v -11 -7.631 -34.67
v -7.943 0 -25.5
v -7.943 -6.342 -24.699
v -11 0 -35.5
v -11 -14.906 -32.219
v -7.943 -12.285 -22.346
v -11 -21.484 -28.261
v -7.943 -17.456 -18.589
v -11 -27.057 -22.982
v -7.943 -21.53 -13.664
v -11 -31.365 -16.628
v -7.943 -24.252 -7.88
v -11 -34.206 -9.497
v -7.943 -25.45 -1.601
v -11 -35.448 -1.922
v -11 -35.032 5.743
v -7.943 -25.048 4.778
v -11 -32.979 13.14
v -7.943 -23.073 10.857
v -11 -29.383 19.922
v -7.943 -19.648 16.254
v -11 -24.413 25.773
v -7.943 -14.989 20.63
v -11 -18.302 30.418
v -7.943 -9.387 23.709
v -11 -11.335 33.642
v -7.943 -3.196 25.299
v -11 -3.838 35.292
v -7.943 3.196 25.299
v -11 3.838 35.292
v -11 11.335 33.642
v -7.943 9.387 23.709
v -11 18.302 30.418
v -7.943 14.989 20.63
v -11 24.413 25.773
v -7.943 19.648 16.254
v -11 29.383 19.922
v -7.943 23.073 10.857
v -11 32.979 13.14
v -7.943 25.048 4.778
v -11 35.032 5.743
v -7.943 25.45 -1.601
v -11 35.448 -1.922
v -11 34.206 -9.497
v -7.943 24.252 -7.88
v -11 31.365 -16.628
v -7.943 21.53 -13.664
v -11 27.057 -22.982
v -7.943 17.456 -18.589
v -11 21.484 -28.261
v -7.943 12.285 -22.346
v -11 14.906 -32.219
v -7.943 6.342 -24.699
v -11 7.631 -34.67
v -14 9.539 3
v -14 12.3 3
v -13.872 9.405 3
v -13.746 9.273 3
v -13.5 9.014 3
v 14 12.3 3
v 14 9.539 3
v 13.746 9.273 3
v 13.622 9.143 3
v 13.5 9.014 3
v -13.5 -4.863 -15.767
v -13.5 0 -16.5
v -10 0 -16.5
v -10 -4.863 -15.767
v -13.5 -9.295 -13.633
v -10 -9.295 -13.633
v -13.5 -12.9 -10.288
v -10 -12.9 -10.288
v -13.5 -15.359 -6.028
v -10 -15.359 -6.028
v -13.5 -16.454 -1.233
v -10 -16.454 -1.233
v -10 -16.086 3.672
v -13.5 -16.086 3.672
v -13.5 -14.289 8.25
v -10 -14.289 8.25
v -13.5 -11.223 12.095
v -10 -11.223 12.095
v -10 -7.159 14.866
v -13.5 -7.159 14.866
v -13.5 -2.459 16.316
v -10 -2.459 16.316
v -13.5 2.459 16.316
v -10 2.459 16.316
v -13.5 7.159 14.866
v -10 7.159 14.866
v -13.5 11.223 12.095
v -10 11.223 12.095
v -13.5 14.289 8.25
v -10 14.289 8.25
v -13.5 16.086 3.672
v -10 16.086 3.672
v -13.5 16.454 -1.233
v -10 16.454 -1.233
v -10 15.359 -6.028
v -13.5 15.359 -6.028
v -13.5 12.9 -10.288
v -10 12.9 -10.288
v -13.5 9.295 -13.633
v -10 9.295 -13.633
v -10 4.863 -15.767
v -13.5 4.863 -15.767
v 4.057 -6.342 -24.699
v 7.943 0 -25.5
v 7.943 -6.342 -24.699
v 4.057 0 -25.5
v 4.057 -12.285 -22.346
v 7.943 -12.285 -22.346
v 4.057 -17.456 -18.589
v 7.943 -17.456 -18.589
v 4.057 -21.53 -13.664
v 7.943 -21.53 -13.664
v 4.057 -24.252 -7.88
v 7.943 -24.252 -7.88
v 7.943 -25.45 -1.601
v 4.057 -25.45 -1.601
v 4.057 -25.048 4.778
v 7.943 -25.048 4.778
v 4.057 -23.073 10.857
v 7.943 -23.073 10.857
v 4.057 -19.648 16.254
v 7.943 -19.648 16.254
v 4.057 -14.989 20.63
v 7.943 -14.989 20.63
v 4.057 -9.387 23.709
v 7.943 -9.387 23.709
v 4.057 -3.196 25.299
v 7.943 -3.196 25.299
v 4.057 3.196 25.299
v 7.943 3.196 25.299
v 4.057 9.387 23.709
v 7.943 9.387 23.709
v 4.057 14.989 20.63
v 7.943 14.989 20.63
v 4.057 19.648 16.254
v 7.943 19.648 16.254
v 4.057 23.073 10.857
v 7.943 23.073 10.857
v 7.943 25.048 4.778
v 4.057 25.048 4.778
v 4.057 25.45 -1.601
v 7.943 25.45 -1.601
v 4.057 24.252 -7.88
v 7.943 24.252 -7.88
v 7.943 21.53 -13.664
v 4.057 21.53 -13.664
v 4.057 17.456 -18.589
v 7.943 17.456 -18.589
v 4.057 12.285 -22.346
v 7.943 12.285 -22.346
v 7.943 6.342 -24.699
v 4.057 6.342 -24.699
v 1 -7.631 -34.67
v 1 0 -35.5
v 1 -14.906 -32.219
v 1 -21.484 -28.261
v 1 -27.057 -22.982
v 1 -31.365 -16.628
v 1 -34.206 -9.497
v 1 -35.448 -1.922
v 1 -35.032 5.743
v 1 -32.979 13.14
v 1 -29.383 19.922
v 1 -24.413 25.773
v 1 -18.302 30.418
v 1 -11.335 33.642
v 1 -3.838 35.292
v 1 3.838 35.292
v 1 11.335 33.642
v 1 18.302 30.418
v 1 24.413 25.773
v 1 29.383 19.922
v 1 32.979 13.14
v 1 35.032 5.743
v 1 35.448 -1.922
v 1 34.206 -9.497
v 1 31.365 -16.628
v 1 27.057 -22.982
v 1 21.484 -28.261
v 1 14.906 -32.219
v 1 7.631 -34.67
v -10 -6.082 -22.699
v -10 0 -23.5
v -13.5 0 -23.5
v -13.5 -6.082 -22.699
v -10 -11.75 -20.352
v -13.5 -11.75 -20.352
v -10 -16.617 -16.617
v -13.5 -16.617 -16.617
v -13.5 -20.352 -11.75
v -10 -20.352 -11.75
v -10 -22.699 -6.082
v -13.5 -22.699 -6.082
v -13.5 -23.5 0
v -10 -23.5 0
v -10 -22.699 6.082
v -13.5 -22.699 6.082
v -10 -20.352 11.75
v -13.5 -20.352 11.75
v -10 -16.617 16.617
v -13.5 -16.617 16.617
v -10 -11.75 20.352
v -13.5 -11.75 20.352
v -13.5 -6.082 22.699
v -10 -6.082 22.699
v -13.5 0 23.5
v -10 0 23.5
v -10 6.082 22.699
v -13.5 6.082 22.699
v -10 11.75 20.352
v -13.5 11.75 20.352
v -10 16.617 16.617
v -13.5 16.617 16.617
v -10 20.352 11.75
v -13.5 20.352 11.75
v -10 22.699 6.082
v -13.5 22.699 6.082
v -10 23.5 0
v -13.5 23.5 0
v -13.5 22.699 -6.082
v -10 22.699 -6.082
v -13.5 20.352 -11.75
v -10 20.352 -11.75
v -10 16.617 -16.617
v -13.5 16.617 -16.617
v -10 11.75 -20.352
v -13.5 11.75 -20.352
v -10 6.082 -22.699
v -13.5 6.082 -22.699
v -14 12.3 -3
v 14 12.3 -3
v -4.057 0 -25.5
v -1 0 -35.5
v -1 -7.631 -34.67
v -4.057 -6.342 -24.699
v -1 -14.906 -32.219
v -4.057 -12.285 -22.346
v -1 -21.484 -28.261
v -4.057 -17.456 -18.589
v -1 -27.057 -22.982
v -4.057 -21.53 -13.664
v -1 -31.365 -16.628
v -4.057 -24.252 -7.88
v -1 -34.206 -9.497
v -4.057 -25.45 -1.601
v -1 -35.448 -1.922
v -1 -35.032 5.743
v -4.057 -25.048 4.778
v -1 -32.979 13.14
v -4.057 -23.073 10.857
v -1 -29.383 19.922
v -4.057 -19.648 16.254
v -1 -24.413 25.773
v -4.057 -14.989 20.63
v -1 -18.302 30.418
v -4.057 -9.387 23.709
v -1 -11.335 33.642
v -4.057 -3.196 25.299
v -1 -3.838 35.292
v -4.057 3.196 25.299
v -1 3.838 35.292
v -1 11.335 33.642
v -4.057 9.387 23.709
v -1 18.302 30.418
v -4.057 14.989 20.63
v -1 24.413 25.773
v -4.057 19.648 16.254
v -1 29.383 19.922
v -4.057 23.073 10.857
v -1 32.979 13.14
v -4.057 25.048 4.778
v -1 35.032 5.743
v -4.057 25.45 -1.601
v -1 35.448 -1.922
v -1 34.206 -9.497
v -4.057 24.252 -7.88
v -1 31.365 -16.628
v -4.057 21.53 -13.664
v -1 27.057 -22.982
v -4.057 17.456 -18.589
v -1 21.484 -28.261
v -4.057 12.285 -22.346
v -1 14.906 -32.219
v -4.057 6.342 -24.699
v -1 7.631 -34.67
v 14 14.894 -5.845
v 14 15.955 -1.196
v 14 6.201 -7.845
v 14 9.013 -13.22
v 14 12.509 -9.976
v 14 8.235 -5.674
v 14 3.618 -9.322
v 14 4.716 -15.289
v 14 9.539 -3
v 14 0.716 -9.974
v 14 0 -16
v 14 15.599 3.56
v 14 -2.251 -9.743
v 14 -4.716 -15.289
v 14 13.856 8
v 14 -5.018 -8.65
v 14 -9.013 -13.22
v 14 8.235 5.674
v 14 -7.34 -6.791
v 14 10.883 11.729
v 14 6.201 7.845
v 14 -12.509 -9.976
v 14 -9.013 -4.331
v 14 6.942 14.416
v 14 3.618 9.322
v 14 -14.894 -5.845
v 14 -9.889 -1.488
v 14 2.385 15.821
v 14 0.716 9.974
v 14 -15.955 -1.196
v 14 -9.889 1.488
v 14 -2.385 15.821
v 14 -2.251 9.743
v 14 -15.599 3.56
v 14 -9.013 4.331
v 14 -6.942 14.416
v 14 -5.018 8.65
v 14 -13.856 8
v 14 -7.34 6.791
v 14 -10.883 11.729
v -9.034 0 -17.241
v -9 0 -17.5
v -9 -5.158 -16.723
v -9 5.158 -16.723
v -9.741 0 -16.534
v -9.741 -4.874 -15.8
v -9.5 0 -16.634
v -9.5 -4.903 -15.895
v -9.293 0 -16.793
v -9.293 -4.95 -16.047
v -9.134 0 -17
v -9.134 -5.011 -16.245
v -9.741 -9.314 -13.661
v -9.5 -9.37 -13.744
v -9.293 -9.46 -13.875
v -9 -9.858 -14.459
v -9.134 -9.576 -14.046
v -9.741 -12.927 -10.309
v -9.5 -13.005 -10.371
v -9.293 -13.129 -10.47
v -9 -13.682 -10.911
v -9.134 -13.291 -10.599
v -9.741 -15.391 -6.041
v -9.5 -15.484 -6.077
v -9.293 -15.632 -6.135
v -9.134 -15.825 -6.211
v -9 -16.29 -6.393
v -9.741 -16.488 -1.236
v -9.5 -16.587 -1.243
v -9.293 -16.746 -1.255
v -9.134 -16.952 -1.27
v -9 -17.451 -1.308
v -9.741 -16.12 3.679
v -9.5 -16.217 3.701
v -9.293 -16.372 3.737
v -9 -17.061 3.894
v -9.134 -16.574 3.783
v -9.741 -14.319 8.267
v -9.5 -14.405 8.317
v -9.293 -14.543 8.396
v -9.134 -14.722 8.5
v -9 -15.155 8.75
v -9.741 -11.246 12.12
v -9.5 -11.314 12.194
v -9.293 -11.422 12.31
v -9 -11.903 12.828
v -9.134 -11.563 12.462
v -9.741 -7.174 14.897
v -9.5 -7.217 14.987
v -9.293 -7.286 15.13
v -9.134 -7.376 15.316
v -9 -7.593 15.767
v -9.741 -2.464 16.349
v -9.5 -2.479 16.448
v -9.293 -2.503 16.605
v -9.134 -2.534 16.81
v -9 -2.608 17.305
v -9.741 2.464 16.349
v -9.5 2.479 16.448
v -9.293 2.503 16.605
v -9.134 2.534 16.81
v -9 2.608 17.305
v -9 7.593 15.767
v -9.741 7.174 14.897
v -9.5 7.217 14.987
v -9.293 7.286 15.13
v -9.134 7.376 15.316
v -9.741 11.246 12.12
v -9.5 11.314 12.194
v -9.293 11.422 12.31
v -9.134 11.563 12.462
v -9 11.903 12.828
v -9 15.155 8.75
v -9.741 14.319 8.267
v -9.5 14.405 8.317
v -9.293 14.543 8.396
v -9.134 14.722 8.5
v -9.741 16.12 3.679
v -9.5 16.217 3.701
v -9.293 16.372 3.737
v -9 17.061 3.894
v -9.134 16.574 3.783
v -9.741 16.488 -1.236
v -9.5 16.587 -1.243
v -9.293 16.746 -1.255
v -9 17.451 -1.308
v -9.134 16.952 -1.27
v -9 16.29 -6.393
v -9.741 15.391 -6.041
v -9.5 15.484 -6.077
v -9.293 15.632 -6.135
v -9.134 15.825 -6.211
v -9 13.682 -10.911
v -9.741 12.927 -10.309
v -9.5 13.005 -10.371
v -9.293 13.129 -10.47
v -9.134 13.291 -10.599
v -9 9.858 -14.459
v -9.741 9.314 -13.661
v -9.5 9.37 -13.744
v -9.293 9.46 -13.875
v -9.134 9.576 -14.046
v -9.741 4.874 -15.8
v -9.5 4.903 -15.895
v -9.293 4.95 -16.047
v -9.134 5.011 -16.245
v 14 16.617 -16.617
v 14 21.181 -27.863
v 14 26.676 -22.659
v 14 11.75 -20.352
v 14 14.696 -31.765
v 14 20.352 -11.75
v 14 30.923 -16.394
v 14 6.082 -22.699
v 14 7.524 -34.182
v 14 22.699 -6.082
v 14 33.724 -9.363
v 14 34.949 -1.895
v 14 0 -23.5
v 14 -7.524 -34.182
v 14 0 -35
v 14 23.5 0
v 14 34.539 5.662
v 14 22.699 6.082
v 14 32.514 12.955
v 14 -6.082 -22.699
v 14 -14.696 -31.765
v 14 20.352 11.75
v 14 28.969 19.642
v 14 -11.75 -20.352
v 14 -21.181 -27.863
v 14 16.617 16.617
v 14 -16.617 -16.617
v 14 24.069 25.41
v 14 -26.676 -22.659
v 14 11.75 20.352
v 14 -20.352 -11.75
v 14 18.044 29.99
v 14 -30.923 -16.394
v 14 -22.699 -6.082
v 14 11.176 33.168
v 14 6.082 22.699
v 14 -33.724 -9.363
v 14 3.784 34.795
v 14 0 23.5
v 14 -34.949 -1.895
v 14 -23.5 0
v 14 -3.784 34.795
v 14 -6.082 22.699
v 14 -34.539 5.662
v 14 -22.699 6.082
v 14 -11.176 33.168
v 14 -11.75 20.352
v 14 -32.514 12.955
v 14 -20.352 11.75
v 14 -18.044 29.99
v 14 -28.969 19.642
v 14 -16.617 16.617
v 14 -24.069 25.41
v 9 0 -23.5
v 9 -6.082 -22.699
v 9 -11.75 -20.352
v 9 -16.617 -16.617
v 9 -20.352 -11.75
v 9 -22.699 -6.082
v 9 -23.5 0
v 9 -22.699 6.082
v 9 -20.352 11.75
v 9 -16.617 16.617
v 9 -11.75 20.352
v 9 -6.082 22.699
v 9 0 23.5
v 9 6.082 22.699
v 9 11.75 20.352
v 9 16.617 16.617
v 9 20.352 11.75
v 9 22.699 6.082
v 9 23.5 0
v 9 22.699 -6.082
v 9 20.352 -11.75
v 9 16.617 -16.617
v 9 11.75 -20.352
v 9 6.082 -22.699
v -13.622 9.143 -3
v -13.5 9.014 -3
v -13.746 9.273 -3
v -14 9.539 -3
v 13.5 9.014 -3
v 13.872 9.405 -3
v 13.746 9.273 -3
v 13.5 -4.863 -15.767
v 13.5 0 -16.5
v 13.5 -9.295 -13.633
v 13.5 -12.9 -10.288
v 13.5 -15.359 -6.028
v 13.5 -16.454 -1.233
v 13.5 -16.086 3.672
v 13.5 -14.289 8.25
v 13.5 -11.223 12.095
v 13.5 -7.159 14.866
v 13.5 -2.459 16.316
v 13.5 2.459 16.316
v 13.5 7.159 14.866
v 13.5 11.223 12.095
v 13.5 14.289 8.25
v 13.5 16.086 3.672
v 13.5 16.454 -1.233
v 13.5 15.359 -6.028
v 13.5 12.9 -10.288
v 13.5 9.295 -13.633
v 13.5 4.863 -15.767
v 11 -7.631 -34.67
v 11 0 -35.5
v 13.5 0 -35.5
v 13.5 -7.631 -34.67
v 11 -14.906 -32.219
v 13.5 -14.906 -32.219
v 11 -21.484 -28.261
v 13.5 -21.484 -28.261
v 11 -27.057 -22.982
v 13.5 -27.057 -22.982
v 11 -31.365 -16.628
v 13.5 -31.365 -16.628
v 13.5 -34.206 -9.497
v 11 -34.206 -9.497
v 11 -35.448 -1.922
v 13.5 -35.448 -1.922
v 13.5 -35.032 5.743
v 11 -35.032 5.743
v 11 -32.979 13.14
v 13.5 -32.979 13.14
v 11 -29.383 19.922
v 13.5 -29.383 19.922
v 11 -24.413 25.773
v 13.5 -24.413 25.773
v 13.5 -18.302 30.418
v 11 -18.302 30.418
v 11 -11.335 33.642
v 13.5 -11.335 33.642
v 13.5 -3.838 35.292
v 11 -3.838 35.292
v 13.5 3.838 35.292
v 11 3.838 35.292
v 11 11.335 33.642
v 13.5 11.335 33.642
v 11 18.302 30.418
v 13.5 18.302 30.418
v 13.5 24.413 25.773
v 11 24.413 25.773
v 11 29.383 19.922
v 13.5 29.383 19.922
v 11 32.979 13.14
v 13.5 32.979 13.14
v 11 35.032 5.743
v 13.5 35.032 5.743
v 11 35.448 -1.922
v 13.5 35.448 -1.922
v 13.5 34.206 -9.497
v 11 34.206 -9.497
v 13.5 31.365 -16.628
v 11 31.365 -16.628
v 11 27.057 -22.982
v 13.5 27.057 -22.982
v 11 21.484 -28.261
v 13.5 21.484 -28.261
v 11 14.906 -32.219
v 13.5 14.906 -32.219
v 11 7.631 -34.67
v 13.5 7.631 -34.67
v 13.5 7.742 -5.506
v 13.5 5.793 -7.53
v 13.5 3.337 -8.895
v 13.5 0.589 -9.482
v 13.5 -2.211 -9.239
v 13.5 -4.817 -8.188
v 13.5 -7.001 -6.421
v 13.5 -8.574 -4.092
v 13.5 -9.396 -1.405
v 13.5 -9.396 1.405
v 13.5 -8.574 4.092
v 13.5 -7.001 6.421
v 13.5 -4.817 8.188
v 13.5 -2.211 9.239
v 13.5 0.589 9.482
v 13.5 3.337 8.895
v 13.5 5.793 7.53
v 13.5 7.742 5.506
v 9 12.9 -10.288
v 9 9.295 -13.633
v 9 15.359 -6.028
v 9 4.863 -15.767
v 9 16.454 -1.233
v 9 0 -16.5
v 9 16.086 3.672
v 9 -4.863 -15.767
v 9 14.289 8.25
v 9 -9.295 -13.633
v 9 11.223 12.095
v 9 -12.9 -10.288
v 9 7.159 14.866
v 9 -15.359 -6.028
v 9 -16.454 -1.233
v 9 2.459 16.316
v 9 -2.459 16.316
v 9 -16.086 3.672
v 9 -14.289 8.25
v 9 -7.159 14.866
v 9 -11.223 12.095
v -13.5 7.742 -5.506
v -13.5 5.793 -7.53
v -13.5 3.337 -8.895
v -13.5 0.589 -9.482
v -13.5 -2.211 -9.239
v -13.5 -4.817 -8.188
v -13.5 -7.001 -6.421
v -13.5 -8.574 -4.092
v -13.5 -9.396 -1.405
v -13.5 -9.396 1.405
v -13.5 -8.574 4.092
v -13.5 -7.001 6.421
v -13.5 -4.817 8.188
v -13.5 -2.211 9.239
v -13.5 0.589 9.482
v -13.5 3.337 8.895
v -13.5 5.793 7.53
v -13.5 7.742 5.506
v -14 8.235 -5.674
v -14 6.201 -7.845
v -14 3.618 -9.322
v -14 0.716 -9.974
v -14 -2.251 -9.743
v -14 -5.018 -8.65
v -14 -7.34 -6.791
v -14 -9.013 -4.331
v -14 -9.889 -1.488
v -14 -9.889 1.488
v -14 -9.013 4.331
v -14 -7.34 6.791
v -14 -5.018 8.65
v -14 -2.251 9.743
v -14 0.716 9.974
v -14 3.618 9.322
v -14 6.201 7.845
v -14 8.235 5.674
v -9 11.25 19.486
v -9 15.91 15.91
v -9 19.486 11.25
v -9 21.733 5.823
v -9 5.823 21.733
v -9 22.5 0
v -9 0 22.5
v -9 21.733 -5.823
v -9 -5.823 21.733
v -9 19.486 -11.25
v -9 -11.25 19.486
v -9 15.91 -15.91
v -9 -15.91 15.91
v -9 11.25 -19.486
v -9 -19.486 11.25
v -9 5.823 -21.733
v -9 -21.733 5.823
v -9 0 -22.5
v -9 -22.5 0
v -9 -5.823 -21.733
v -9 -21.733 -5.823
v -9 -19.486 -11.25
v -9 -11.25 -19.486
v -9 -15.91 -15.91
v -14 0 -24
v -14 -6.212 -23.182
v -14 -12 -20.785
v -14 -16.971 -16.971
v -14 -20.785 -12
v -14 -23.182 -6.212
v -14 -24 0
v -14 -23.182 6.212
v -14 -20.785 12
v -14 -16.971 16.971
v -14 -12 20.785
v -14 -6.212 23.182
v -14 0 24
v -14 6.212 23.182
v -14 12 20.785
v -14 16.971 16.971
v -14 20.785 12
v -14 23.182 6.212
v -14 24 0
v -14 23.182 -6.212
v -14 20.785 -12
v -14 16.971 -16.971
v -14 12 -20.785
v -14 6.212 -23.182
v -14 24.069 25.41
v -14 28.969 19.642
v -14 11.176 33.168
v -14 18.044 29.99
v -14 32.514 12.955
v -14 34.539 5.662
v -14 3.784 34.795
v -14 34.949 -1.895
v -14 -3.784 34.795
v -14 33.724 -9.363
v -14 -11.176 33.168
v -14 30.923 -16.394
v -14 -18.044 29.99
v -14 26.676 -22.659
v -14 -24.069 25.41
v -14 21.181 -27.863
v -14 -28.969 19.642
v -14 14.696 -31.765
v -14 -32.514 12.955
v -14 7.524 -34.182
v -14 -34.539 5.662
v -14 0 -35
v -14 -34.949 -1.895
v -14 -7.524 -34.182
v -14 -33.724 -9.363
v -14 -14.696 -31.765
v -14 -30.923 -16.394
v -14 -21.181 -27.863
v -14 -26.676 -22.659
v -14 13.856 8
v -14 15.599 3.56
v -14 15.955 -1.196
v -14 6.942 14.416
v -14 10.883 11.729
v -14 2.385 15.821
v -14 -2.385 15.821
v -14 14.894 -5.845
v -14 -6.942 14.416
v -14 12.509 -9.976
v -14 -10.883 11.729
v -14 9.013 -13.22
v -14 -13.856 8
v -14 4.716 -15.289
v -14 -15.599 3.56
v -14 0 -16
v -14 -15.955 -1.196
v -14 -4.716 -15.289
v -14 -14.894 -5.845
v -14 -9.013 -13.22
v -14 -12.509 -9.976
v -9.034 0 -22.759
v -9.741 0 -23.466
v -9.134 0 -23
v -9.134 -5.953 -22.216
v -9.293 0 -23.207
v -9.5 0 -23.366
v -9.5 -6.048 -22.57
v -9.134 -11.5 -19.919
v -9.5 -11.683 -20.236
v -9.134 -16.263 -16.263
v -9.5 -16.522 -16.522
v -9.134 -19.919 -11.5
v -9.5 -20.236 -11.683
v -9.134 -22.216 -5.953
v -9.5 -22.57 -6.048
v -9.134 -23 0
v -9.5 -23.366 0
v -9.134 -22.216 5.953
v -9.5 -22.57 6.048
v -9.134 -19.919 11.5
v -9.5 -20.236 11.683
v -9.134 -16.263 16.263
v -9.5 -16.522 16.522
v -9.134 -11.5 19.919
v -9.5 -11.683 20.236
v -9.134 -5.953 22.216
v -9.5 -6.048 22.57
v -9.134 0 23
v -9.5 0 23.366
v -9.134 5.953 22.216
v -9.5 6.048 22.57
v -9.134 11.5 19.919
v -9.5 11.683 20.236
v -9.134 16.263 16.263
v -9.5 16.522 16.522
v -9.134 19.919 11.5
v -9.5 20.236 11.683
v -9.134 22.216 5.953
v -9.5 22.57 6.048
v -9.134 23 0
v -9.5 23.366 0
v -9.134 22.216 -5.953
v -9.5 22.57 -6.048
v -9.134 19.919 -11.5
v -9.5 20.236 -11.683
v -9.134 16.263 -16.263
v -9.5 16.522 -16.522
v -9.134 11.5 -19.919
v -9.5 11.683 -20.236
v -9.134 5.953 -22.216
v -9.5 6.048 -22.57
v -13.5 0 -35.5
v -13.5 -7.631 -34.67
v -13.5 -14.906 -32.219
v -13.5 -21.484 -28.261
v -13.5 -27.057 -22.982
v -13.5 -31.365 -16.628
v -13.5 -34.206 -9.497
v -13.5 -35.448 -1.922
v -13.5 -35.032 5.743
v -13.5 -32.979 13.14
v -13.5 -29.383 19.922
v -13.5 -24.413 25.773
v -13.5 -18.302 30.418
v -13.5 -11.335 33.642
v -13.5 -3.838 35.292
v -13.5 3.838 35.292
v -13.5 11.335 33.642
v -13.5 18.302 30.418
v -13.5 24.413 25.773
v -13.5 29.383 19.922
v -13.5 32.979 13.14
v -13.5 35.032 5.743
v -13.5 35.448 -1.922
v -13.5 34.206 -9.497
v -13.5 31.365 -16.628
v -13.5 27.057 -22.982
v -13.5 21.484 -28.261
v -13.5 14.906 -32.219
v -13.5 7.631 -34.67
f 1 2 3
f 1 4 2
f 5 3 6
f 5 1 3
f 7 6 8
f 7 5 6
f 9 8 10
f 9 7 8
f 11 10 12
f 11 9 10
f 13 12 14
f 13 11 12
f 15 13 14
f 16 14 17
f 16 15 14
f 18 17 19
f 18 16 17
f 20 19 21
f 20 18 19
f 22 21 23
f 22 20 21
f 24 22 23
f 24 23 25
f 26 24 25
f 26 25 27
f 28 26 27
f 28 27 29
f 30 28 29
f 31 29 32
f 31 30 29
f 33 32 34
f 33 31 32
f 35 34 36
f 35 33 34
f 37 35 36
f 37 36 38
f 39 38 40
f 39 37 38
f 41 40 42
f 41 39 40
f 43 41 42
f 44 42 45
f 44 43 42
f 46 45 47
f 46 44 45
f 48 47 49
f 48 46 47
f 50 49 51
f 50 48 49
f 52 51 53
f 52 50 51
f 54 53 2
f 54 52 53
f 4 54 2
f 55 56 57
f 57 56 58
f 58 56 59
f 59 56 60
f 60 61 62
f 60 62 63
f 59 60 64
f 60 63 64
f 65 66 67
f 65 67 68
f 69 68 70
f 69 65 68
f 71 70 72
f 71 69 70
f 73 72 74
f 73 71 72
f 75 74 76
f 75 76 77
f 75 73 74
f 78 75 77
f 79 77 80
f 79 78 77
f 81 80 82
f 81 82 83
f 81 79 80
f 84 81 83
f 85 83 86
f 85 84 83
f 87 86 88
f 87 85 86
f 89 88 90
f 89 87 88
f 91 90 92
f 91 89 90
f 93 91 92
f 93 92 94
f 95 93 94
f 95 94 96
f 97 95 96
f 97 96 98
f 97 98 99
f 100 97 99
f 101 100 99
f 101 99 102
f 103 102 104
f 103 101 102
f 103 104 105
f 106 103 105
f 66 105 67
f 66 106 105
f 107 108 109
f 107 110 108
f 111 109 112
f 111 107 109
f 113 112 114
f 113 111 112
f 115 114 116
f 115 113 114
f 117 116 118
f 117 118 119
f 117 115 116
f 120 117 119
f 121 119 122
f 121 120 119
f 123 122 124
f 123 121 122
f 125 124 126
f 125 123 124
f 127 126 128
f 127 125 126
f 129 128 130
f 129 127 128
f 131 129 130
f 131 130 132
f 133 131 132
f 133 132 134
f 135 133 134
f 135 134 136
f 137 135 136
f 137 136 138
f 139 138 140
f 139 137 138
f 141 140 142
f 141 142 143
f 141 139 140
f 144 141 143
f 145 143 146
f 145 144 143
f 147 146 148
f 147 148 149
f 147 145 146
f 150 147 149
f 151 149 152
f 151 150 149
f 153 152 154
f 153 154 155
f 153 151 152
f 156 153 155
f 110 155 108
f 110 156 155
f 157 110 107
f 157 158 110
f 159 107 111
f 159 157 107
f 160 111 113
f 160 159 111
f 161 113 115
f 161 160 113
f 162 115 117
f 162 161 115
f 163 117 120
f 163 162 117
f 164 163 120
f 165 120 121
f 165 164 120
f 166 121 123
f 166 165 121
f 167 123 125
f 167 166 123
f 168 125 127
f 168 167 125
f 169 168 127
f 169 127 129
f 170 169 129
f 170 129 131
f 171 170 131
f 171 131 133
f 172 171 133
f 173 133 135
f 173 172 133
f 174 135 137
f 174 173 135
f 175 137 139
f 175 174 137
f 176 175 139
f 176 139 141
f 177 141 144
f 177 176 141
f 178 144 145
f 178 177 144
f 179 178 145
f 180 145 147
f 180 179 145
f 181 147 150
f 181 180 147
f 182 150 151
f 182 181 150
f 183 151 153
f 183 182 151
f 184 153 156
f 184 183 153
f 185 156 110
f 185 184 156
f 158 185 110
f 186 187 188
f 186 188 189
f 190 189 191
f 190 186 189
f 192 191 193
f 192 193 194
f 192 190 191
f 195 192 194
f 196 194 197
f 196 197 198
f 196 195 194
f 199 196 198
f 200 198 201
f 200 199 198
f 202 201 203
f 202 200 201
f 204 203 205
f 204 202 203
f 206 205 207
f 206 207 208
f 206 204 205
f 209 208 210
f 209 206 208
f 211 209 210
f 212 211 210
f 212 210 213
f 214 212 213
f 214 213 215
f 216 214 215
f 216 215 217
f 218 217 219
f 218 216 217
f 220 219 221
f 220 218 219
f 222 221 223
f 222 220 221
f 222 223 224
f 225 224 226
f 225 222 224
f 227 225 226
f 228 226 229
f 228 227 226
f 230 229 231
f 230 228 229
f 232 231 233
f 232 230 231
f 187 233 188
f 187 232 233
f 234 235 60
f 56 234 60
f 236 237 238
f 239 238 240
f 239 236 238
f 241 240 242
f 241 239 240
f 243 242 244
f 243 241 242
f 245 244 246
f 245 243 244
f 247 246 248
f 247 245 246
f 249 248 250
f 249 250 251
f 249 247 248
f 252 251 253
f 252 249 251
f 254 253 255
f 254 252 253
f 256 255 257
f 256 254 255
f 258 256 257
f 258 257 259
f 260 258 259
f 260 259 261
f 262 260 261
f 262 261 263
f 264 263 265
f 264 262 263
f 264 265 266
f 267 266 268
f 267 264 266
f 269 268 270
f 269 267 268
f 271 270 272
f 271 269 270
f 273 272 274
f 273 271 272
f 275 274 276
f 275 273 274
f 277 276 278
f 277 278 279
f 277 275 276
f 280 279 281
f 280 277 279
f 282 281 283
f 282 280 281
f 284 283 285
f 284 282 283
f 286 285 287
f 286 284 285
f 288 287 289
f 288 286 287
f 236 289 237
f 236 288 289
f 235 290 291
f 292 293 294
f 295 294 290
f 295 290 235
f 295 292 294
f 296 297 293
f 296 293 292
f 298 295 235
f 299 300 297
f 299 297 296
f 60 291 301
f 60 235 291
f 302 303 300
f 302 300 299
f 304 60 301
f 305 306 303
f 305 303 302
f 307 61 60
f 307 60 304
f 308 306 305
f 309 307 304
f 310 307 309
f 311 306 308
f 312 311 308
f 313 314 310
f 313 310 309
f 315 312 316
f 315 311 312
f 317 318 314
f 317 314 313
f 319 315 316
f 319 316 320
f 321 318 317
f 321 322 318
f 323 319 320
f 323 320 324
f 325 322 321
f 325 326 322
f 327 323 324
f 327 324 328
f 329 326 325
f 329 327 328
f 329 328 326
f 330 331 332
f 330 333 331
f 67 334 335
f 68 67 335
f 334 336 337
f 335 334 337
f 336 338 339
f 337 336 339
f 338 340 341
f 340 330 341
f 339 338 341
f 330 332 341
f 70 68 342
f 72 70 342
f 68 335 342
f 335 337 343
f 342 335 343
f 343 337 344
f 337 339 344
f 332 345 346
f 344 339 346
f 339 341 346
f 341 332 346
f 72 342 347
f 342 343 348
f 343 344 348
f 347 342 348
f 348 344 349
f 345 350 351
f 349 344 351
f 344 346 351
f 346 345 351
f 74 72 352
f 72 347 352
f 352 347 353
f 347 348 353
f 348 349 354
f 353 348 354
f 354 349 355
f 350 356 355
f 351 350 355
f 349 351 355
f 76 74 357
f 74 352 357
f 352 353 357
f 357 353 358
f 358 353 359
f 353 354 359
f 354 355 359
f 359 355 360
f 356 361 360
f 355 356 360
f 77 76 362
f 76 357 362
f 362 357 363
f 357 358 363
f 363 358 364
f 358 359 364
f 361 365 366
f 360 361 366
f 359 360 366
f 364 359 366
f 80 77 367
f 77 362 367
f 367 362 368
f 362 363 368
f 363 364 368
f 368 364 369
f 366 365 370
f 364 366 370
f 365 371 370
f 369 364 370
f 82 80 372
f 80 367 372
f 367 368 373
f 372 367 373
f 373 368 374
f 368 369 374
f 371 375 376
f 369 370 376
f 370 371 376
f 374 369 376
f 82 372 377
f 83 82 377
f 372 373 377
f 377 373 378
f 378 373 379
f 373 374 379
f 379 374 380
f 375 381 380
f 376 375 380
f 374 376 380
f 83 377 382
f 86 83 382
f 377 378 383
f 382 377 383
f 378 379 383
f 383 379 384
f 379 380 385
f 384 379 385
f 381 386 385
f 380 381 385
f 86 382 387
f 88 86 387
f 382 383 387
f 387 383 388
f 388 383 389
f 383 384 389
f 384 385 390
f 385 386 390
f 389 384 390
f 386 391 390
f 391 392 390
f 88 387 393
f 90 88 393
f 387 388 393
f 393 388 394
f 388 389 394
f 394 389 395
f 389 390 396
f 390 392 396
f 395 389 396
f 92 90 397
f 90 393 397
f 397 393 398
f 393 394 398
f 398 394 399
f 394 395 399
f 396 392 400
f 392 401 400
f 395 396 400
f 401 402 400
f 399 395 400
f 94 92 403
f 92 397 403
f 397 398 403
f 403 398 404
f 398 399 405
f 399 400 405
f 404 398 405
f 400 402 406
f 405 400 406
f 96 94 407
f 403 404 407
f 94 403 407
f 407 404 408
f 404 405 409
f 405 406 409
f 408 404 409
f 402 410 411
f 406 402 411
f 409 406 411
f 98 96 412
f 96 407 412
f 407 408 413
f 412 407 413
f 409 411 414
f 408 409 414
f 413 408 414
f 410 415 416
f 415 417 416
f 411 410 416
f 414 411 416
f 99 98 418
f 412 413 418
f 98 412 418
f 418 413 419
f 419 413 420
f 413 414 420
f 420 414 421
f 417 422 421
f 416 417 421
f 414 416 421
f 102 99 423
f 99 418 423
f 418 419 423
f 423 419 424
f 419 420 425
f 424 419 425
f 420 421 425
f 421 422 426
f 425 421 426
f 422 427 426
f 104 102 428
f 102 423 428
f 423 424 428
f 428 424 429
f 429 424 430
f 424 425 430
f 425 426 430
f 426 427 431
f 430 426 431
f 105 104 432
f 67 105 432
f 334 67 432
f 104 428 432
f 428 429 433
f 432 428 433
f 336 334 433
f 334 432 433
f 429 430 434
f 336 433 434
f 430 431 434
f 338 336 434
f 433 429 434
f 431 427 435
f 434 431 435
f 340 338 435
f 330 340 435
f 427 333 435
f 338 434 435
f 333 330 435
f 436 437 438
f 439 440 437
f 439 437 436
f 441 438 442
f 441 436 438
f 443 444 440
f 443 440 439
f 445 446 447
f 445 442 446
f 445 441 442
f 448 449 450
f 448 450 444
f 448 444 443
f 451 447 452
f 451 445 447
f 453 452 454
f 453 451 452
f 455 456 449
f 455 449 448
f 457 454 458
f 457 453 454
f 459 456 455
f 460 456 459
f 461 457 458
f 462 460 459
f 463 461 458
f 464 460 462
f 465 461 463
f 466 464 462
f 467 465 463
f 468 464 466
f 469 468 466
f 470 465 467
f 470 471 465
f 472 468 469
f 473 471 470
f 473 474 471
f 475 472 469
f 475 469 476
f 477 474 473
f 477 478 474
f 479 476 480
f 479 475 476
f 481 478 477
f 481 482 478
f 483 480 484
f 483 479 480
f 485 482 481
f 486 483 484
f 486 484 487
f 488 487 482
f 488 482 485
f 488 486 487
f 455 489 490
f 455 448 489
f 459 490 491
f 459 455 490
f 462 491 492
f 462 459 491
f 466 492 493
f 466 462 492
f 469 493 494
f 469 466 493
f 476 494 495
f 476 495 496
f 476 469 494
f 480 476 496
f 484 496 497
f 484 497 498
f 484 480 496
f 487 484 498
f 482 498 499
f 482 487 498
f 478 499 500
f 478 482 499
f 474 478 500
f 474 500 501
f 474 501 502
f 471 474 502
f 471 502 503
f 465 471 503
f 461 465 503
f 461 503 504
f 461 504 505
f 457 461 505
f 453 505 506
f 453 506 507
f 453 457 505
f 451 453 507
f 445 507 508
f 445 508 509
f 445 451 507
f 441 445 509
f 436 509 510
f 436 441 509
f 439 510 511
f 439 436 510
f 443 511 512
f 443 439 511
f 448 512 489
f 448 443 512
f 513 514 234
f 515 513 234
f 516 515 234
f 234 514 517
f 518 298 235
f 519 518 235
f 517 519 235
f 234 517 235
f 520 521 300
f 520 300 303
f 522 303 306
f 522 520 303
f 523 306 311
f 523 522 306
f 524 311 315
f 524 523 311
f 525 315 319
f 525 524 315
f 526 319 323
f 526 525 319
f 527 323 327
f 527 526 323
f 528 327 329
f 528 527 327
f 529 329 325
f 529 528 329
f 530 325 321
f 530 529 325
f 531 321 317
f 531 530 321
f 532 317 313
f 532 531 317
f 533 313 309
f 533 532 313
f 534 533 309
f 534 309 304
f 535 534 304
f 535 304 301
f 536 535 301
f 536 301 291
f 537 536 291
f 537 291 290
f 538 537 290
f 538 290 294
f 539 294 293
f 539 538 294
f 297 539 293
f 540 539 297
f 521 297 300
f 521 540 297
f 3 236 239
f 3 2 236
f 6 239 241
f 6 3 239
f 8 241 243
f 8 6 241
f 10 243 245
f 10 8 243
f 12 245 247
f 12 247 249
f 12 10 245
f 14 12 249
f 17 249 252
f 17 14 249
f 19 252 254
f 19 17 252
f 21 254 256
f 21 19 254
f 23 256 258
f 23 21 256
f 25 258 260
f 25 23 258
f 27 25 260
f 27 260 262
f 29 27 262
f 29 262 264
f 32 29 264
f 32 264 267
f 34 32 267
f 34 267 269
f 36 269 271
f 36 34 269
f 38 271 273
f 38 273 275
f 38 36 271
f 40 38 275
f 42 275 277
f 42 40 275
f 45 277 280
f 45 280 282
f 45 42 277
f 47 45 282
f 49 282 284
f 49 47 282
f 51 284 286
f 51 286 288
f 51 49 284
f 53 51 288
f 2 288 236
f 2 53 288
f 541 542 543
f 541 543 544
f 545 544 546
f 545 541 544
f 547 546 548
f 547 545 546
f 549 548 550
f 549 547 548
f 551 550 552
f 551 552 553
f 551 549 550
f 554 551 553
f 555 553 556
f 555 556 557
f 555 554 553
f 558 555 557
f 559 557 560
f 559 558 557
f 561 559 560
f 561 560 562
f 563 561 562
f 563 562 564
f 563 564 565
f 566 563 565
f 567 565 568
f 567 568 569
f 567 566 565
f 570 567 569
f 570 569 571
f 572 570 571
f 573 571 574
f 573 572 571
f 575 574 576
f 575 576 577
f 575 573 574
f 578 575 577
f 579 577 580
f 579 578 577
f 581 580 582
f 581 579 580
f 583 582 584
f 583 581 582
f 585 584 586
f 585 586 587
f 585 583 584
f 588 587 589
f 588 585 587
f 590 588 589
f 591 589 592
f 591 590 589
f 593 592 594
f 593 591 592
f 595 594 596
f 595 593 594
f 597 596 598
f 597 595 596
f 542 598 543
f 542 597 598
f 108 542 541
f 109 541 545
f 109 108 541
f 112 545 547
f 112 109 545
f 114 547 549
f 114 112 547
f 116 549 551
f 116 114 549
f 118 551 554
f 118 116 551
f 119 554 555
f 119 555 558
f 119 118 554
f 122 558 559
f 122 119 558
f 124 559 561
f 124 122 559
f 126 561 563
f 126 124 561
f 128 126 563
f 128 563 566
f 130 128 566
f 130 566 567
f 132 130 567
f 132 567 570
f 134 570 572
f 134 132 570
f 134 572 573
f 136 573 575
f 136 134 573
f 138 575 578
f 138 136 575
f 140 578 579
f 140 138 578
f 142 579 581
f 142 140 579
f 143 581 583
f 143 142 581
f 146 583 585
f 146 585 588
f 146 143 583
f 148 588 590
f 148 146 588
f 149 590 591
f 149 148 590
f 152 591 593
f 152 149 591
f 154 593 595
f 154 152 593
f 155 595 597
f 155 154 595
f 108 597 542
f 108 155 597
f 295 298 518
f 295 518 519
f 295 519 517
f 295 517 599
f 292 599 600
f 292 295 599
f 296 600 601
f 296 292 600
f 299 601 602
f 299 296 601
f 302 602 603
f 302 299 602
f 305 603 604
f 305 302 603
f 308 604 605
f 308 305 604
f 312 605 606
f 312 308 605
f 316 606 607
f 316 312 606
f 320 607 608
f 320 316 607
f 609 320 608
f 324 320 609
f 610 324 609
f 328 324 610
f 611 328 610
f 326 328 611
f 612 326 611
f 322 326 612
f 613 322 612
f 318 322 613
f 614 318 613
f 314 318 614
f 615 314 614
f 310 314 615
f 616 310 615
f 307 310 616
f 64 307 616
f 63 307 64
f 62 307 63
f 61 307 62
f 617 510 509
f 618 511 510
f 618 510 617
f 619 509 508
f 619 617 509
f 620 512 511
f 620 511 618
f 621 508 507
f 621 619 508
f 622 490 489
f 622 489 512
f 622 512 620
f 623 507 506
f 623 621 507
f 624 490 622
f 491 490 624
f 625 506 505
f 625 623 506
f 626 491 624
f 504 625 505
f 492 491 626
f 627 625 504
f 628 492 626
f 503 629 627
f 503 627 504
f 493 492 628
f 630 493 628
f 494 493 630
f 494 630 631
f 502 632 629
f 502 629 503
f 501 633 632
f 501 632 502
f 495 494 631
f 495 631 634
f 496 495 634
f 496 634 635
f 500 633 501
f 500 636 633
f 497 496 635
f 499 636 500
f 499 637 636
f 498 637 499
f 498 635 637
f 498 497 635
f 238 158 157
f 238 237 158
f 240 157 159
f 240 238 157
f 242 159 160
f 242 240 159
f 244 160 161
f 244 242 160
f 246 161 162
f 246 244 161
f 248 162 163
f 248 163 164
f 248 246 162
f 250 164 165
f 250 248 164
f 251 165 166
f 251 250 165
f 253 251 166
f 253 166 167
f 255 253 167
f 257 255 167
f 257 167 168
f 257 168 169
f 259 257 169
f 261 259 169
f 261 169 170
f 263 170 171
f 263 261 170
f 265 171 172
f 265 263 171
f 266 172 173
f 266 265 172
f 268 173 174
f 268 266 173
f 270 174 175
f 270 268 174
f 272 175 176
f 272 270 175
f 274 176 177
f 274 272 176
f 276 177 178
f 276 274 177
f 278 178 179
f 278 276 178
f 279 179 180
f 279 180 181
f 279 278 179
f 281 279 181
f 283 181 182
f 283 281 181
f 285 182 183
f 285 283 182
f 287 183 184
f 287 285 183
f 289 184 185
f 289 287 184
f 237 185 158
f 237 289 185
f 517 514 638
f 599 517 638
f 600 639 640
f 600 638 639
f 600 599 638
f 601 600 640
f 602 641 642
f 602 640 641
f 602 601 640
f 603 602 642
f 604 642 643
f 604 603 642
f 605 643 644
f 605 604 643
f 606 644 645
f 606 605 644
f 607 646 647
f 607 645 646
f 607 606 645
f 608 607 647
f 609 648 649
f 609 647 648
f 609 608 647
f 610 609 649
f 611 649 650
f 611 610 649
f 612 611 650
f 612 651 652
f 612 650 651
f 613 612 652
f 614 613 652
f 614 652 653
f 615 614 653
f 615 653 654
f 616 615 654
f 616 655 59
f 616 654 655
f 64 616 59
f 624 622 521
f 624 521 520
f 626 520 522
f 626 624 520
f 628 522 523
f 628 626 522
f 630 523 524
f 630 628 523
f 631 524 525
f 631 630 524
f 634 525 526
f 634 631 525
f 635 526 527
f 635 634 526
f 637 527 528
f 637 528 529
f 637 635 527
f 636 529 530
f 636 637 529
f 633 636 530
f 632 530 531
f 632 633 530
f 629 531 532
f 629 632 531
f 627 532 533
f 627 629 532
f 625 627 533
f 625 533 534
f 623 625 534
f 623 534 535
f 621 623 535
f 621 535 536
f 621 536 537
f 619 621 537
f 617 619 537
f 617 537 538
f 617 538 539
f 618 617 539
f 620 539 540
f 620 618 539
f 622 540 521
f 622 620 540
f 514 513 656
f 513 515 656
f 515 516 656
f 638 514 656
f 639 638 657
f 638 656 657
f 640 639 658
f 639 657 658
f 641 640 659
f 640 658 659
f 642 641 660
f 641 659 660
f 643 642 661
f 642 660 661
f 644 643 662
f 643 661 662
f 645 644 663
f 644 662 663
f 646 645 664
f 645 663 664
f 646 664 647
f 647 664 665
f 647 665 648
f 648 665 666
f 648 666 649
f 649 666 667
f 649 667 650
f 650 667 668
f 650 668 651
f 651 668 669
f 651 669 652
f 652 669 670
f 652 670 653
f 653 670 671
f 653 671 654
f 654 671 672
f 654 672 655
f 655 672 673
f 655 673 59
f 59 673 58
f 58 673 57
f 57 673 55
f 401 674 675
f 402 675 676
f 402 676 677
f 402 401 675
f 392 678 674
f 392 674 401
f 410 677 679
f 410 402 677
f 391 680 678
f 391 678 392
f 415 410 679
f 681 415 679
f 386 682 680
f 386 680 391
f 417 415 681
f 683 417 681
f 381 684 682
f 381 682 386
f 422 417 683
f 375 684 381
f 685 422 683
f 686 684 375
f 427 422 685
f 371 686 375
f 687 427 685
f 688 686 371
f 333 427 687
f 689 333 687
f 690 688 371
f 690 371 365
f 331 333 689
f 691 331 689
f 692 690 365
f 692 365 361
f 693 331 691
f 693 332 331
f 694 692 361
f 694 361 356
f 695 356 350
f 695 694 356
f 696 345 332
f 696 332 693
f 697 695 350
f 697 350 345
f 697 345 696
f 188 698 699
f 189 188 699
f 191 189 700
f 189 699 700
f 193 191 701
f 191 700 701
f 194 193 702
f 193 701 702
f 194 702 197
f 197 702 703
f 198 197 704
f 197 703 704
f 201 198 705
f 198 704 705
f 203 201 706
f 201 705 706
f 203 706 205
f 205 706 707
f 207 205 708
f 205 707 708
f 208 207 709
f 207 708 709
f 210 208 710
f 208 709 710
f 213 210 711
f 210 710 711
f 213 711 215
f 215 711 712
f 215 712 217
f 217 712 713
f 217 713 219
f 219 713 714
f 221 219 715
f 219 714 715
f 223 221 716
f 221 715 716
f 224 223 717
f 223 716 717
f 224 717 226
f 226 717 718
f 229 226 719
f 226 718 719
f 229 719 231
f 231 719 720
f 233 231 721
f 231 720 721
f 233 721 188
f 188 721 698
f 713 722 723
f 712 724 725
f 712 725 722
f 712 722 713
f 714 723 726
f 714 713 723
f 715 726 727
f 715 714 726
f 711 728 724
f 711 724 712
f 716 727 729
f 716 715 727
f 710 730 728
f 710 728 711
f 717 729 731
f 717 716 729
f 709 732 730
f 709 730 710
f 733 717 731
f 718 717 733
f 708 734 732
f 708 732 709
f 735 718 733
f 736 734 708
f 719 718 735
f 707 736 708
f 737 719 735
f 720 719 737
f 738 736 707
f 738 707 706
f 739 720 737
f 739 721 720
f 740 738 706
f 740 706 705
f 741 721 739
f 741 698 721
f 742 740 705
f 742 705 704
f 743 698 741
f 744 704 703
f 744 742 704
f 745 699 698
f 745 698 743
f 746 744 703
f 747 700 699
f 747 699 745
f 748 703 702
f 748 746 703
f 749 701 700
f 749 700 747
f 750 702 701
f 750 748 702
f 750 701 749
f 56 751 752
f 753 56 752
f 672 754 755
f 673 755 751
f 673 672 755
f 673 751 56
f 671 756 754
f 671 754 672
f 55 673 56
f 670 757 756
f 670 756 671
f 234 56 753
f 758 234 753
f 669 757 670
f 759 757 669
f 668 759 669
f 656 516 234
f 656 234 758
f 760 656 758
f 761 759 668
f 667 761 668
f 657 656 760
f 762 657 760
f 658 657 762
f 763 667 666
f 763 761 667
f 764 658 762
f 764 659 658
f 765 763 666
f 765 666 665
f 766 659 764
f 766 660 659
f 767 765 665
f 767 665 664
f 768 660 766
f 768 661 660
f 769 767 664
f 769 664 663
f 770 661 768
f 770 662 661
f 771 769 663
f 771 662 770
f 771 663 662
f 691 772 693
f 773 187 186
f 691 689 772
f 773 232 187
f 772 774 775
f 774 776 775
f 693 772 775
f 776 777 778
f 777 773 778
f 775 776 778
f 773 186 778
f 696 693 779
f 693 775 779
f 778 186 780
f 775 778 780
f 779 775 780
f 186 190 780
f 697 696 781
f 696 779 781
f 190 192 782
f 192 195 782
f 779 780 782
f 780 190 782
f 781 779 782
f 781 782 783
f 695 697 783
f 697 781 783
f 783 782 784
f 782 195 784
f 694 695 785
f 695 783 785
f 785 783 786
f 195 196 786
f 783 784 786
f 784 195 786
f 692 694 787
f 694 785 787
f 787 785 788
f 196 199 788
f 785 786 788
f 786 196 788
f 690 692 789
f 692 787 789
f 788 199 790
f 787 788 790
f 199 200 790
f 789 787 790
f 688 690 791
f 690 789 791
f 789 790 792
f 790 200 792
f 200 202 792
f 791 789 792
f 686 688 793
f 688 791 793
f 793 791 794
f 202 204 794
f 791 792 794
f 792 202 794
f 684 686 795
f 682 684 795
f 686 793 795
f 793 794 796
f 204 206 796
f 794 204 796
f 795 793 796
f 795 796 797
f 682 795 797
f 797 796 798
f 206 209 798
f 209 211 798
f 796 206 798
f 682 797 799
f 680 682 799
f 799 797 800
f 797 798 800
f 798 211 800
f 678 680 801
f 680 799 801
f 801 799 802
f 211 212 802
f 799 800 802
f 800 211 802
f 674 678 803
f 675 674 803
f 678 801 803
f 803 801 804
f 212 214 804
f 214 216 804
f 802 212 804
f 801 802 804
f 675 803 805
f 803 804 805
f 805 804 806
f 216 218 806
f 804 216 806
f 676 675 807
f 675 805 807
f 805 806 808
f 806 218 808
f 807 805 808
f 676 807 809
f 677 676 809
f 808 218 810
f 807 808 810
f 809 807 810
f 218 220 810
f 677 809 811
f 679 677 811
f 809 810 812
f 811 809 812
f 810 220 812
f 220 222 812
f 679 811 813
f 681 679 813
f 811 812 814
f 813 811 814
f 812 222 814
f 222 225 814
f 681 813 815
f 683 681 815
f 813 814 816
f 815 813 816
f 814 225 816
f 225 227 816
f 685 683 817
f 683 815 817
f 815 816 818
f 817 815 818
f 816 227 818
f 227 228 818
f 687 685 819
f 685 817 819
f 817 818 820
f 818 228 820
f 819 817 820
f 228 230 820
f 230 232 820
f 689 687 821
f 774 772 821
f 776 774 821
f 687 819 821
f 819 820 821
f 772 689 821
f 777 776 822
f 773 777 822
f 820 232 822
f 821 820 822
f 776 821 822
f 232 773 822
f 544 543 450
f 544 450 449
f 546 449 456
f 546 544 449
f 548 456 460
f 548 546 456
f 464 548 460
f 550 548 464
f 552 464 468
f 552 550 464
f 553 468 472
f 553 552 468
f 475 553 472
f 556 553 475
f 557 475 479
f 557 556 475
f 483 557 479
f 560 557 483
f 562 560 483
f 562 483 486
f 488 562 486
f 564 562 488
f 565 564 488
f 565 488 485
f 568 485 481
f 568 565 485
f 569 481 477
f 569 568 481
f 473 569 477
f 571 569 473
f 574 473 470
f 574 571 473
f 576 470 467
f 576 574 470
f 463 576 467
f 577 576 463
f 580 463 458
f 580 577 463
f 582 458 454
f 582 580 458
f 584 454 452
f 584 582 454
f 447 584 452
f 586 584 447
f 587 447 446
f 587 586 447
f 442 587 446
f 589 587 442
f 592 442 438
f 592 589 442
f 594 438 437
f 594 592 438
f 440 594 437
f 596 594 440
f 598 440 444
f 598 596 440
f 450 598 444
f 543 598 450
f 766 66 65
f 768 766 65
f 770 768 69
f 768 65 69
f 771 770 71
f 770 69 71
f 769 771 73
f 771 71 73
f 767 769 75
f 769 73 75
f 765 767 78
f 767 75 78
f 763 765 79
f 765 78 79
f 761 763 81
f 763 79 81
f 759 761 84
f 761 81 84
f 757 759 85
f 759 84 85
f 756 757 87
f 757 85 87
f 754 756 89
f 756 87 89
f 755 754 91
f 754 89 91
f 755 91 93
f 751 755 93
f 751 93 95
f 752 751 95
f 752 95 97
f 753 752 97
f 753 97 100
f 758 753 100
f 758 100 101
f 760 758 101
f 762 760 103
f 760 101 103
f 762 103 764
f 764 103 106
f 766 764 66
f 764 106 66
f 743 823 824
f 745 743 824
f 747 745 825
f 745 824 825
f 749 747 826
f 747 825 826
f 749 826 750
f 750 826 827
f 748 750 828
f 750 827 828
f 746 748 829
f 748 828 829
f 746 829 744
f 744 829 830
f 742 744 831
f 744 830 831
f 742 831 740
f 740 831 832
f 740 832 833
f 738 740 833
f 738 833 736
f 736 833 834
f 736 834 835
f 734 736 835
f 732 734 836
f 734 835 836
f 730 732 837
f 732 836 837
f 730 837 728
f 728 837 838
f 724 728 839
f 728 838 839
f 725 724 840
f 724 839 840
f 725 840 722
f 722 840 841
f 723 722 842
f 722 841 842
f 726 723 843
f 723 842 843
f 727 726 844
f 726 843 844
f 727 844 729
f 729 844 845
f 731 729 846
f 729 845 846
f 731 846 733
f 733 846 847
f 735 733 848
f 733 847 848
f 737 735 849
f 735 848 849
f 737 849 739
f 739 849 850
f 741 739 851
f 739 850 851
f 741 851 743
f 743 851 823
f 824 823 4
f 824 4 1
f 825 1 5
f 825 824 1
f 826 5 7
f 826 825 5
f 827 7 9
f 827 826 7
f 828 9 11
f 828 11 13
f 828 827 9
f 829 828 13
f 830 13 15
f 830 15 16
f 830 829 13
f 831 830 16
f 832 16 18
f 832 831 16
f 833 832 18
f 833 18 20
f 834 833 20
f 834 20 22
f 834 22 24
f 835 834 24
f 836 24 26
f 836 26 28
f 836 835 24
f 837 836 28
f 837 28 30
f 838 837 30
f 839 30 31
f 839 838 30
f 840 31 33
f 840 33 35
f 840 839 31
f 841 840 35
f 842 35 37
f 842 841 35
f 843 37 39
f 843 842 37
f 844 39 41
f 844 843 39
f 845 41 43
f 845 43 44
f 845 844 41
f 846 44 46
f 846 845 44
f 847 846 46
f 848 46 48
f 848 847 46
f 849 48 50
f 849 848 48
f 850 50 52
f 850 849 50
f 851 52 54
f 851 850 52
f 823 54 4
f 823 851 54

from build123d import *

# Parameters (mm, degrees)
CHAMFER1_SIZE      = 0.5
CHAMFER2_SIZE      = 0.5
FILLET2_R          = 1
CUT_EXTRUDE1_DEPTH = 58.484780595


with BuildPart() as part:
    # Sketch1 → Revolve1 (revolve)
    with BuildSketch(Plane(origin=(0, 0, 0), x_dir=(1, 0, 0), z_dir=(0, 1, 0))):
        Polygon((-14, 35.5), (-14, 23.5), (-9, 23.5), (-9, 16.5), (-14, 16.5), (-14, 9.5), (14, 9.5), (14, 16.5), (9, 16.5), (9, 23.5), (14, 23.5), (14, 35.5), (11, 35.5), (7.942693185, 25.5), (4.057306815, 25.5), (1, 35.5), (-1, 35.5), (-4.057306815, 25.5), (-7.942693185, 25.5), (-11, 35.5), align=None)
    revolve(axis=Axis((0, 0, 0), (-1, 0, 0)))

    # Chamfer1
    chamfer1_edges = [part.edges().sort_by_distance(p)[0] for p in [
        (14, 0, 9.5),
        (14, 0, 16.5),
        (14, 0, 35.5),
    ]]
    chamfer(chamfer1_edges, length=CHAMFER1_SIZE)

    # Chamfer2
    chamfer2_edges = [part.edges().sort_by_distance(p)[0] for p in [
        (-14, 0, 35.5),
        (-14, 0, 23.5),
        (-14, 0, 16.5),
        (-14, 0, 9.5),
    ]]
    chamfer(chamfer2_edges, length=CHAMFER2_SIZE)

    # Fillet2
    fillet2_edges = [part.edges().sort_by_distance(p)[0] for p in [
        (-9, 0, 23.5),
        (-9, 0, 16.5),
    ]]
    fillet(fillet2_edges, radius=FILLET2_R)

    # Sketch2 → Cut-Extrude1 (cut, through all)
    with BuildSketch(Plane(origin=(14, 0, 0), x_dir=(0, 0, -1), z_dir=(1, 0, 0))):
        Polygon((-3, 12.3), (-3, 7.432980878), (3, 7.432980878), (3, 9.5), (3, 12.3), align=None)
    extrude(amount=-CUT_EXTRUDE1_DEPTH, mode=Mode.SUBTRACT)


solid = part.part
